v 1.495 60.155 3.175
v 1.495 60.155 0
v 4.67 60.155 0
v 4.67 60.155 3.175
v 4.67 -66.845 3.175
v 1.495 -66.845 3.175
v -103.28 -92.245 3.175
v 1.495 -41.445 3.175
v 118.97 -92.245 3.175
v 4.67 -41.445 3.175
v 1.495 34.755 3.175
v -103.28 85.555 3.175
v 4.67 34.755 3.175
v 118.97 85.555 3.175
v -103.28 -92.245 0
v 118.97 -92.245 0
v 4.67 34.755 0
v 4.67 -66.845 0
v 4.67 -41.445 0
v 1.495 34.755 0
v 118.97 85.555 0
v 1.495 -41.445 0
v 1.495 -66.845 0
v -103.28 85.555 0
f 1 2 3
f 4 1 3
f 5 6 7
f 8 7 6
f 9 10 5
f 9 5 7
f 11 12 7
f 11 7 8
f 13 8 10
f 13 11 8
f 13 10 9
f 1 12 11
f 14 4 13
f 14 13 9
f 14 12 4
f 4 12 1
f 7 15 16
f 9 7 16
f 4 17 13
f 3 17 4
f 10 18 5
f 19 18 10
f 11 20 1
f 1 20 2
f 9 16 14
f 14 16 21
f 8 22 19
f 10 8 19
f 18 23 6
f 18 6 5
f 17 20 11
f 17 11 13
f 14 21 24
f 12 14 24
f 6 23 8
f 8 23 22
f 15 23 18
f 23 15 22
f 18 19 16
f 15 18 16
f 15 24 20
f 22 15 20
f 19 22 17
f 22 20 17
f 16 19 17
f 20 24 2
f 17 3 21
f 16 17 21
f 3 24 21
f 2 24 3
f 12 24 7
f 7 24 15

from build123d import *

# Parameters (mm, degrees)
F0_W     = 3.175
F0_H     = 25.4
F1_DEPTH = 3.175


with BuildPart() as f1:
    # F0 (on Top) → F1 (new body)
    with BuildSketch(Plane.XY):
        Polygon((118.969828, 85.555037), (-103.280172, 85.555037), (-103.280172, -3.344963), (99.919828, -3.344963), (118.969828, -3.344963), align=None)
        with Locations((3.082328, 47.455037)):
            Rectangle(F0_W, F0_H, mode=Mode.SUBTRACT)
        Polygon((99.919828, -3.344963), (-103.280172, -3.344963), (-103.280172, -92.244963), (118.969828, -92.244963), (118.969828, -3.344963), align=None)
        with Locations((3.082328, -54.144963)):
            Rectangle(F0_W, F0_H, mode=Mode.SUBTRACT)
    extrude(amount=F1_DEPTH)


solid = f1.part
